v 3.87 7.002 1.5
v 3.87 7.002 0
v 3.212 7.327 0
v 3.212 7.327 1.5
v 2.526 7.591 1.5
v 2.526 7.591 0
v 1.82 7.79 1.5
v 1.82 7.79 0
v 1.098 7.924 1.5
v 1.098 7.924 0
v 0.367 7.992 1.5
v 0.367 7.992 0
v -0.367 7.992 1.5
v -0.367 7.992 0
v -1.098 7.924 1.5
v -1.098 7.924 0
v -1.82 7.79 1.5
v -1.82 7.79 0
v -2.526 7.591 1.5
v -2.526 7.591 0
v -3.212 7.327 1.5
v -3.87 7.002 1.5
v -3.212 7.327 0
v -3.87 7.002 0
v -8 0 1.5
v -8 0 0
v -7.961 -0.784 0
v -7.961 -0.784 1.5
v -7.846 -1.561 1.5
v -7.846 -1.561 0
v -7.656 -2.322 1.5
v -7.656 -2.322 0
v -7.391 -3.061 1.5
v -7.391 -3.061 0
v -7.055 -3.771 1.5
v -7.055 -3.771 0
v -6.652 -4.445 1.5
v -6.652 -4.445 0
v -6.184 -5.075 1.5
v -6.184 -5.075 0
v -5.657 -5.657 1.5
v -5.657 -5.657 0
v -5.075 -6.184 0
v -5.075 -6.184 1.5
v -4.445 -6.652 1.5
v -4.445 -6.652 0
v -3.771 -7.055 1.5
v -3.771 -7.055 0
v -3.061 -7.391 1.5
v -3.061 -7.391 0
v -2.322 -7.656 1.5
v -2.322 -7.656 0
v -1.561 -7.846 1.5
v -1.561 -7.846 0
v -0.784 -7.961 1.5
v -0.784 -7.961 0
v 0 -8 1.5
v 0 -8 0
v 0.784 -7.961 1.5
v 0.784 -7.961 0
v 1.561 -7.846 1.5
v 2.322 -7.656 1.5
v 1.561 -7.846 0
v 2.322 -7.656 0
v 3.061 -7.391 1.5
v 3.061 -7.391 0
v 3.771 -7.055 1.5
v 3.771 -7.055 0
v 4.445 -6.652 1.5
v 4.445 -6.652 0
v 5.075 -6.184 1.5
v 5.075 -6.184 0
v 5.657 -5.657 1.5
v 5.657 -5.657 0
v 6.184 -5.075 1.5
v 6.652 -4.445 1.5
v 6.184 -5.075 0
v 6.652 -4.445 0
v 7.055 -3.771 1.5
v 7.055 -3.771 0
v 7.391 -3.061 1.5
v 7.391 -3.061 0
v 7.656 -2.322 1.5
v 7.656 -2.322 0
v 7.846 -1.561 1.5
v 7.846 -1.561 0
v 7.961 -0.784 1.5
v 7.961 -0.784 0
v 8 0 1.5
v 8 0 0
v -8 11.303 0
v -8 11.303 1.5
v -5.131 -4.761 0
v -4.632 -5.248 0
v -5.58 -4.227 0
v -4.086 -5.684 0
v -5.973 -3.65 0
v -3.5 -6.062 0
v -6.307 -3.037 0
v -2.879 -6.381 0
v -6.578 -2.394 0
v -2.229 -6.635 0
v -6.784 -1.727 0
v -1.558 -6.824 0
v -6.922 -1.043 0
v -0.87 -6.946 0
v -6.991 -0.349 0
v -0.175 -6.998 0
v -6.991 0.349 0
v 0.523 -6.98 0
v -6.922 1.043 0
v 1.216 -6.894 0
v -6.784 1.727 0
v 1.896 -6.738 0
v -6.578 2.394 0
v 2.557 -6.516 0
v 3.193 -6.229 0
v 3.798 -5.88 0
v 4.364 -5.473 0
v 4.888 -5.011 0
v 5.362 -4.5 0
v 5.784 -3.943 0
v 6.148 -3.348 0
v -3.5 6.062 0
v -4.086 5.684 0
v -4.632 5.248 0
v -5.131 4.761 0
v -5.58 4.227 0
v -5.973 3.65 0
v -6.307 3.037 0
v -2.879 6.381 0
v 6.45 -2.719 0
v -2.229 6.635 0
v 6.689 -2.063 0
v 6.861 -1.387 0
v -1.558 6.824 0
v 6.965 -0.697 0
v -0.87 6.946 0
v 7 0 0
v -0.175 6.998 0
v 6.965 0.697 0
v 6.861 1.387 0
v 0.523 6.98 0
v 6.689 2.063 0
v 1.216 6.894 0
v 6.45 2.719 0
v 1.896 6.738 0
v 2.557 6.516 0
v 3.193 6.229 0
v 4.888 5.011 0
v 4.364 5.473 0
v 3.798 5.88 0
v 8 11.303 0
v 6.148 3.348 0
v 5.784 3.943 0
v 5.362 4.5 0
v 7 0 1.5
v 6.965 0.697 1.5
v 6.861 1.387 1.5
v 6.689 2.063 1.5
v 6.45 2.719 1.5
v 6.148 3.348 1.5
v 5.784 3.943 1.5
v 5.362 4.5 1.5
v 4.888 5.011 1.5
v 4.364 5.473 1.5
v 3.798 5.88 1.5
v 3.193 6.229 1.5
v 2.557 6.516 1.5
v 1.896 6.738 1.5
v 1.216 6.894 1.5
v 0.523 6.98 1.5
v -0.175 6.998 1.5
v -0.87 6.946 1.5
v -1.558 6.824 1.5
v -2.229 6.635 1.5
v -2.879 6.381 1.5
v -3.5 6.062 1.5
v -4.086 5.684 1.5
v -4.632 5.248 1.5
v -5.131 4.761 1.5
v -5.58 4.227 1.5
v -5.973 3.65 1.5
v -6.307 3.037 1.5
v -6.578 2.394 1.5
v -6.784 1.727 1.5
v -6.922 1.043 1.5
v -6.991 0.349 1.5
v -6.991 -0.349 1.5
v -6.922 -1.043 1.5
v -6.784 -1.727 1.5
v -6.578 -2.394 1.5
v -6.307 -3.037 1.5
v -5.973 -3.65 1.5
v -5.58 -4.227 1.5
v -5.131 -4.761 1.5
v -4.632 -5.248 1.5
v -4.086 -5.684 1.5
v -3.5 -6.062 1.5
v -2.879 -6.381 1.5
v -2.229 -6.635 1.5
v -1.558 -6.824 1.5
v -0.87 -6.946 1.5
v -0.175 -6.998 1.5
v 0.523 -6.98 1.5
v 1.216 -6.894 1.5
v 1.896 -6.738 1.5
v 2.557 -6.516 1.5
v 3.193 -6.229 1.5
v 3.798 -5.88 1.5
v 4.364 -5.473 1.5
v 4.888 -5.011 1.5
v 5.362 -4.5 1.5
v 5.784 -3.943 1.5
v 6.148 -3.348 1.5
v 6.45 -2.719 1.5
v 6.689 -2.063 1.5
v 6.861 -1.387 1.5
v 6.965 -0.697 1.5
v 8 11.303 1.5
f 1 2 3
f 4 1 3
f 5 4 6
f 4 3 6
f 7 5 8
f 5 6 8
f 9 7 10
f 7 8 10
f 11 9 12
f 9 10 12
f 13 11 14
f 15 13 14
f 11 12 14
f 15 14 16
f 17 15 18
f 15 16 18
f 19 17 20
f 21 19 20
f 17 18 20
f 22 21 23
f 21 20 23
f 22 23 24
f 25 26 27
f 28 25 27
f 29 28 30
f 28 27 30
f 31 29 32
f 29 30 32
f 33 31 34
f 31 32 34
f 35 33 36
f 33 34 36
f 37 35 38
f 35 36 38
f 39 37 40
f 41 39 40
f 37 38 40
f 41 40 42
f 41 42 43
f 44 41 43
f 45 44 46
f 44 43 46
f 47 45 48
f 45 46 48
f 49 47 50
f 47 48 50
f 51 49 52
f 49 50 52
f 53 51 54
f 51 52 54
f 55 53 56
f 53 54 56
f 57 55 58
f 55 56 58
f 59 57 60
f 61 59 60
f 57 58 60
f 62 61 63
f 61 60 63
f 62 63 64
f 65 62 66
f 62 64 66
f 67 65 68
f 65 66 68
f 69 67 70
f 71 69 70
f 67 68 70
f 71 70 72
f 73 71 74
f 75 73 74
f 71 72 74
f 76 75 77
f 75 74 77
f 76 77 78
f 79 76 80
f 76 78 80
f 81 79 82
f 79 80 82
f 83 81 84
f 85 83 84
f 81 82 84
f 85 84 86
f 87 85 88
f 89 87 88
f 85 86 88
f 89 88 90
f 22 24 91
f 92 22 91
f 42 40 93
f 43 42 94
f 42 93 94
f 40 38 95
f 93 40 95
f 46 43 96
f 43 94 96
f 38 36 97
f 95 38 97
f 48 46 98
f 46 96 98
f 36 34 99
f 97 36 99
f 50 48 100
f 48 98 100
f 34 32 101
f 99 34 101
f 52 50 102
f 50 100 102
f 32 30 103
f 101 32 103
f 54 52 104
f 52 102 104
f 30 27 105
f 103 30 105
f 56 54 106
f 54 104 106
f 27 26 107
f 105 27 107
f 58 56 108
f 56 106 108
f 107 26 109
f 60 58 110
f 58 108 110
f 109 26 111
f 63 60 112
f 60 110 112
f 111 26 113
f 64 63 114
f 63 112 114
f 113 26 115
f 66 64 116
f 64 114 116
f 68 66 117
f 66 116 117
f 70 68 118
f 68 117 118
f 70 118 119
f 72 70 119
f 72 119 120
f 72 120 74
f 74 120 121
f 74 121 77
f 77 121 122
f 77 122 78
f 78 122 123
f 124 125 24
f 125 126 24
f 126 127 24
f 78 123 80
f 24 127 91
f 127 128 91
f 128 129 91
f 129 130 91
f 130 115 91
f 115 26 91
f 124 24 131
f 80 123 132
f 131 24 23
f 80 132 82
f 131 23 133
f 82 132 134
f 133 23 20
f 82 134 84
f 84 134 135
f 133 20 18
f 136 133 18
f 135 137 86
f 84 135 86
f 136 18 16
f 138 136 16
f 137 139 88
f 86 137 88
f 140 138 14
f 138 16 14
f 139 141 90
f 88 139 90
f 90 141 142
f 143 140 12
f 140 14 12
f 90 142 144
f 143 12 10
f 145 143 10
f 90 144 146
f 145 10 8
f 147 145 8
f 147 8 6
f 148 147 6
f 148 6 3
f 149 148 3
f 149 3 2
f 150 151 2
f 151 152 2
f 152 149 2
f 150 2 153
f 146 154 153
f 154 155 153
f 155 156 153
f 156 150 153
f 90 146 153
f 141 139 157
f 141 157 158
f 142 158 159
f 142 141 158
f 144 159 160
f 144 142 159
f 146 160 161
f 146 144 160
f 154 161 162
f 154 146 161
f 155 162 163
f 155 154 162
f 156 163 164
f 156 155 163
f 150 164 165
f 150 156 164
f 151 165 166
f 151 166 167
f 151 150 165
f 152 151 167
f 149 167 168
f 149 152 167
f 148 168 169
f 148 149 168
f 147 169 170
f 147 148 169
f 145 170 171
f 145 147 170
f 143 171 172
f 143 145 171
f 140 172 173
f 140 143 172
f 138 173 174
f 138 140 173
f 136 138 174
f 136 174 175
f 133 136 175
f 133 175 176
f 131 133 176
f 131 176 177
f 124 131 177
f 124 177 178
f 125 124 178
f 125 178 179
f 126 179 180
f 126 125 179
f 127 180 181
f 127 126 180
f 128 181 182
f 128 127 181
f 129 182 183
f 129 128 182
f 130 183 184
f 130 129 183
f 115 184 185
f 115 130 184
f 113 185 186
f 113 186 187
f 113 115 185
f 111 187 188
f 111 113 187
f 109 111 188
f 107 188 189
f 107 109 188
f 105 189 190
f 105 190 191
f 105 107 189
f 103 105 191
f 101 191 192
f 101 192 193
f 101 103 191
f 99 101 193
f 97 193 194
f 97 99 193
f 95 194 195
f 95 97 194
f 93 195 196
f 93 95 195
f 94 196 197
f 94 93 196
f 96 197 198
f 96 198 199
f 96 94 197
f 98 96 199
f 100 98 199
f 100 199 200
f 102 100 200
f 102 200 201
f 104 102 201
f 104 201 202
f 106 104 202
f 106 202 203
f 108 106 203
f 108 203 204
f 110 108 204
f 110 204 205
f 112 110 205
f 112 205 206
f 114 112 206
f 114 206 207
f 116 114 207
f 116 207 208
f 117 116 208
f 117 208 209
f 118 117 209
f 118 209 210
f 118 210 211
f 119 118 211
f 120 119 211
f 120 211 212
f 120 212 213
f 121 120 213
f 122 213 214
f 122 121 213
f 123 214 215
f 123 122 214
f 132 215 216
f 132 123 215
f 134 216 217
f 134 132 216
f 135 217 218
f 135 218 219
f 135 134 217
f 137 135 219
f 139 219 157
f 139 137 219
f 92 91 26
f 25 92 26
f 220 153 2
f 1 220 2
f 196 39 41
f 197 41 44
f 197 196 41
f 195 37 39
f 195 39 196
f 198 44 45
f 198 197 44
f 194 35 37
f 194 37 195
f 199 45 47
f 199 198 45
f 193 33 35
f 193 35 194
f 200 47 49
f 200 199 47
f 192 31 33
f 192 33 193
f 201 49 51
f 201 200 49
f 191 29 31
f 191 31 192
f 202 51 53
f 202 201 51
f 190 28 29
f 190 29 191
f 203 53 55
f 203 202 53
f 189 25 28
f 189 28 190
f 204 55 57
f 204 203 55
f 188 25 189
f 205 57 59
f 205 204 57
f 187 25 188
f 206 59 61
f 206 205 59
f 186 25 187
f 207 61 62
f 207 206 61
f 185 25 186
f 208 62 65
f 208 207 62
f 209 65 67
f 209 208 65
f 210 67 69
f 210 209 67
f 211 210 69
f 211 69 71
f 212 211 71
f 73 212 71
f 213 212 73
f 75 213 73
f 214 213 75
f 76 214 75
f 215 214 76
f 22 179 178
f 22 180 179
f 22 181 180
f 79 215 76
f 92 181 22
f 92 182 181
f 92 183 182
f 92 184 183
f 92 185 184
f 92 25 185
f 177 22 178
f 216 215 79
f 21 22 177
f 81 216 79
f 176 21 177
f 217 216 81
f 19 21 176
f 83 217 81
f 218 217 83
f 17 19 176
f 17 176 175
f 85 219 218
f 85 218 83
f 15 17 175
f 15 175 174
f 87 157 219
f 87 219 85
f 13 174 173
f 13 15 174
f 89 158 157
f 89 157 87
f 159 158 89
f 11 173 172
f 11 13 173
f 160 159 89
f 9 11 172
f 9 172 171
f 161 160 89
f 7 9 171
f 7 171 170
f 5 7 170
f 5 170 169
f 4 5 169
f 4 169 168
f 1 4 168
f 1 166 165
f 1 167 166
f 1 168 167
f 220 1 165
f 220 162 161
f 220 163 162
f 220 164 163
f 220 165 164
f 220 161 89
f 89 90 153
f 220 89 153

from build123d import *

# Parameters (mm, degrees)
F0_R     = 7
F1_DEPTH = 1.5


with BuildPart() as f1:
    # F0 (on Top) → F1 (new body)
    with BuildSketch(Plane.XY):
        with BuildLine():
            ThreePointArc((-8, 0), (0, -8), (8, 0))
            ThreePointArc((8, 0), (6.890506, 4.064594), (3.869769, 7.001777))
            ThreePointArc((3.869769, 7.001777), (0, 8), (-3.869769, 7.001777))
            ThreePointArc((-3.869769, 7.001777), (-6.890506, 4.064594), (-8, 0))
        make_face()
        Circle(F0_R, mode=Mode.SUBTRACT)
        with BuildLine():
            ThreePointArc((3.869769, 7.001777), (6.890506, 4.064594), (8, 0))
            Line((8, 0), (8, 11.303381))
            Line((8, 11.303381), (3.869769, 7.001777))
        make_face()
        with BuildLine():
            Line((-8, 11.303381), (-8, 0))
            ThreePointArc((-8, 0), (-6.890506, 4.064594), (-3.869769, 7.001777))
            Line((-3.869769, 7.001777), (-8, 11.303381))
        make_face()
    extrude(amount=F1_DEPTH)


solid = f1.part
